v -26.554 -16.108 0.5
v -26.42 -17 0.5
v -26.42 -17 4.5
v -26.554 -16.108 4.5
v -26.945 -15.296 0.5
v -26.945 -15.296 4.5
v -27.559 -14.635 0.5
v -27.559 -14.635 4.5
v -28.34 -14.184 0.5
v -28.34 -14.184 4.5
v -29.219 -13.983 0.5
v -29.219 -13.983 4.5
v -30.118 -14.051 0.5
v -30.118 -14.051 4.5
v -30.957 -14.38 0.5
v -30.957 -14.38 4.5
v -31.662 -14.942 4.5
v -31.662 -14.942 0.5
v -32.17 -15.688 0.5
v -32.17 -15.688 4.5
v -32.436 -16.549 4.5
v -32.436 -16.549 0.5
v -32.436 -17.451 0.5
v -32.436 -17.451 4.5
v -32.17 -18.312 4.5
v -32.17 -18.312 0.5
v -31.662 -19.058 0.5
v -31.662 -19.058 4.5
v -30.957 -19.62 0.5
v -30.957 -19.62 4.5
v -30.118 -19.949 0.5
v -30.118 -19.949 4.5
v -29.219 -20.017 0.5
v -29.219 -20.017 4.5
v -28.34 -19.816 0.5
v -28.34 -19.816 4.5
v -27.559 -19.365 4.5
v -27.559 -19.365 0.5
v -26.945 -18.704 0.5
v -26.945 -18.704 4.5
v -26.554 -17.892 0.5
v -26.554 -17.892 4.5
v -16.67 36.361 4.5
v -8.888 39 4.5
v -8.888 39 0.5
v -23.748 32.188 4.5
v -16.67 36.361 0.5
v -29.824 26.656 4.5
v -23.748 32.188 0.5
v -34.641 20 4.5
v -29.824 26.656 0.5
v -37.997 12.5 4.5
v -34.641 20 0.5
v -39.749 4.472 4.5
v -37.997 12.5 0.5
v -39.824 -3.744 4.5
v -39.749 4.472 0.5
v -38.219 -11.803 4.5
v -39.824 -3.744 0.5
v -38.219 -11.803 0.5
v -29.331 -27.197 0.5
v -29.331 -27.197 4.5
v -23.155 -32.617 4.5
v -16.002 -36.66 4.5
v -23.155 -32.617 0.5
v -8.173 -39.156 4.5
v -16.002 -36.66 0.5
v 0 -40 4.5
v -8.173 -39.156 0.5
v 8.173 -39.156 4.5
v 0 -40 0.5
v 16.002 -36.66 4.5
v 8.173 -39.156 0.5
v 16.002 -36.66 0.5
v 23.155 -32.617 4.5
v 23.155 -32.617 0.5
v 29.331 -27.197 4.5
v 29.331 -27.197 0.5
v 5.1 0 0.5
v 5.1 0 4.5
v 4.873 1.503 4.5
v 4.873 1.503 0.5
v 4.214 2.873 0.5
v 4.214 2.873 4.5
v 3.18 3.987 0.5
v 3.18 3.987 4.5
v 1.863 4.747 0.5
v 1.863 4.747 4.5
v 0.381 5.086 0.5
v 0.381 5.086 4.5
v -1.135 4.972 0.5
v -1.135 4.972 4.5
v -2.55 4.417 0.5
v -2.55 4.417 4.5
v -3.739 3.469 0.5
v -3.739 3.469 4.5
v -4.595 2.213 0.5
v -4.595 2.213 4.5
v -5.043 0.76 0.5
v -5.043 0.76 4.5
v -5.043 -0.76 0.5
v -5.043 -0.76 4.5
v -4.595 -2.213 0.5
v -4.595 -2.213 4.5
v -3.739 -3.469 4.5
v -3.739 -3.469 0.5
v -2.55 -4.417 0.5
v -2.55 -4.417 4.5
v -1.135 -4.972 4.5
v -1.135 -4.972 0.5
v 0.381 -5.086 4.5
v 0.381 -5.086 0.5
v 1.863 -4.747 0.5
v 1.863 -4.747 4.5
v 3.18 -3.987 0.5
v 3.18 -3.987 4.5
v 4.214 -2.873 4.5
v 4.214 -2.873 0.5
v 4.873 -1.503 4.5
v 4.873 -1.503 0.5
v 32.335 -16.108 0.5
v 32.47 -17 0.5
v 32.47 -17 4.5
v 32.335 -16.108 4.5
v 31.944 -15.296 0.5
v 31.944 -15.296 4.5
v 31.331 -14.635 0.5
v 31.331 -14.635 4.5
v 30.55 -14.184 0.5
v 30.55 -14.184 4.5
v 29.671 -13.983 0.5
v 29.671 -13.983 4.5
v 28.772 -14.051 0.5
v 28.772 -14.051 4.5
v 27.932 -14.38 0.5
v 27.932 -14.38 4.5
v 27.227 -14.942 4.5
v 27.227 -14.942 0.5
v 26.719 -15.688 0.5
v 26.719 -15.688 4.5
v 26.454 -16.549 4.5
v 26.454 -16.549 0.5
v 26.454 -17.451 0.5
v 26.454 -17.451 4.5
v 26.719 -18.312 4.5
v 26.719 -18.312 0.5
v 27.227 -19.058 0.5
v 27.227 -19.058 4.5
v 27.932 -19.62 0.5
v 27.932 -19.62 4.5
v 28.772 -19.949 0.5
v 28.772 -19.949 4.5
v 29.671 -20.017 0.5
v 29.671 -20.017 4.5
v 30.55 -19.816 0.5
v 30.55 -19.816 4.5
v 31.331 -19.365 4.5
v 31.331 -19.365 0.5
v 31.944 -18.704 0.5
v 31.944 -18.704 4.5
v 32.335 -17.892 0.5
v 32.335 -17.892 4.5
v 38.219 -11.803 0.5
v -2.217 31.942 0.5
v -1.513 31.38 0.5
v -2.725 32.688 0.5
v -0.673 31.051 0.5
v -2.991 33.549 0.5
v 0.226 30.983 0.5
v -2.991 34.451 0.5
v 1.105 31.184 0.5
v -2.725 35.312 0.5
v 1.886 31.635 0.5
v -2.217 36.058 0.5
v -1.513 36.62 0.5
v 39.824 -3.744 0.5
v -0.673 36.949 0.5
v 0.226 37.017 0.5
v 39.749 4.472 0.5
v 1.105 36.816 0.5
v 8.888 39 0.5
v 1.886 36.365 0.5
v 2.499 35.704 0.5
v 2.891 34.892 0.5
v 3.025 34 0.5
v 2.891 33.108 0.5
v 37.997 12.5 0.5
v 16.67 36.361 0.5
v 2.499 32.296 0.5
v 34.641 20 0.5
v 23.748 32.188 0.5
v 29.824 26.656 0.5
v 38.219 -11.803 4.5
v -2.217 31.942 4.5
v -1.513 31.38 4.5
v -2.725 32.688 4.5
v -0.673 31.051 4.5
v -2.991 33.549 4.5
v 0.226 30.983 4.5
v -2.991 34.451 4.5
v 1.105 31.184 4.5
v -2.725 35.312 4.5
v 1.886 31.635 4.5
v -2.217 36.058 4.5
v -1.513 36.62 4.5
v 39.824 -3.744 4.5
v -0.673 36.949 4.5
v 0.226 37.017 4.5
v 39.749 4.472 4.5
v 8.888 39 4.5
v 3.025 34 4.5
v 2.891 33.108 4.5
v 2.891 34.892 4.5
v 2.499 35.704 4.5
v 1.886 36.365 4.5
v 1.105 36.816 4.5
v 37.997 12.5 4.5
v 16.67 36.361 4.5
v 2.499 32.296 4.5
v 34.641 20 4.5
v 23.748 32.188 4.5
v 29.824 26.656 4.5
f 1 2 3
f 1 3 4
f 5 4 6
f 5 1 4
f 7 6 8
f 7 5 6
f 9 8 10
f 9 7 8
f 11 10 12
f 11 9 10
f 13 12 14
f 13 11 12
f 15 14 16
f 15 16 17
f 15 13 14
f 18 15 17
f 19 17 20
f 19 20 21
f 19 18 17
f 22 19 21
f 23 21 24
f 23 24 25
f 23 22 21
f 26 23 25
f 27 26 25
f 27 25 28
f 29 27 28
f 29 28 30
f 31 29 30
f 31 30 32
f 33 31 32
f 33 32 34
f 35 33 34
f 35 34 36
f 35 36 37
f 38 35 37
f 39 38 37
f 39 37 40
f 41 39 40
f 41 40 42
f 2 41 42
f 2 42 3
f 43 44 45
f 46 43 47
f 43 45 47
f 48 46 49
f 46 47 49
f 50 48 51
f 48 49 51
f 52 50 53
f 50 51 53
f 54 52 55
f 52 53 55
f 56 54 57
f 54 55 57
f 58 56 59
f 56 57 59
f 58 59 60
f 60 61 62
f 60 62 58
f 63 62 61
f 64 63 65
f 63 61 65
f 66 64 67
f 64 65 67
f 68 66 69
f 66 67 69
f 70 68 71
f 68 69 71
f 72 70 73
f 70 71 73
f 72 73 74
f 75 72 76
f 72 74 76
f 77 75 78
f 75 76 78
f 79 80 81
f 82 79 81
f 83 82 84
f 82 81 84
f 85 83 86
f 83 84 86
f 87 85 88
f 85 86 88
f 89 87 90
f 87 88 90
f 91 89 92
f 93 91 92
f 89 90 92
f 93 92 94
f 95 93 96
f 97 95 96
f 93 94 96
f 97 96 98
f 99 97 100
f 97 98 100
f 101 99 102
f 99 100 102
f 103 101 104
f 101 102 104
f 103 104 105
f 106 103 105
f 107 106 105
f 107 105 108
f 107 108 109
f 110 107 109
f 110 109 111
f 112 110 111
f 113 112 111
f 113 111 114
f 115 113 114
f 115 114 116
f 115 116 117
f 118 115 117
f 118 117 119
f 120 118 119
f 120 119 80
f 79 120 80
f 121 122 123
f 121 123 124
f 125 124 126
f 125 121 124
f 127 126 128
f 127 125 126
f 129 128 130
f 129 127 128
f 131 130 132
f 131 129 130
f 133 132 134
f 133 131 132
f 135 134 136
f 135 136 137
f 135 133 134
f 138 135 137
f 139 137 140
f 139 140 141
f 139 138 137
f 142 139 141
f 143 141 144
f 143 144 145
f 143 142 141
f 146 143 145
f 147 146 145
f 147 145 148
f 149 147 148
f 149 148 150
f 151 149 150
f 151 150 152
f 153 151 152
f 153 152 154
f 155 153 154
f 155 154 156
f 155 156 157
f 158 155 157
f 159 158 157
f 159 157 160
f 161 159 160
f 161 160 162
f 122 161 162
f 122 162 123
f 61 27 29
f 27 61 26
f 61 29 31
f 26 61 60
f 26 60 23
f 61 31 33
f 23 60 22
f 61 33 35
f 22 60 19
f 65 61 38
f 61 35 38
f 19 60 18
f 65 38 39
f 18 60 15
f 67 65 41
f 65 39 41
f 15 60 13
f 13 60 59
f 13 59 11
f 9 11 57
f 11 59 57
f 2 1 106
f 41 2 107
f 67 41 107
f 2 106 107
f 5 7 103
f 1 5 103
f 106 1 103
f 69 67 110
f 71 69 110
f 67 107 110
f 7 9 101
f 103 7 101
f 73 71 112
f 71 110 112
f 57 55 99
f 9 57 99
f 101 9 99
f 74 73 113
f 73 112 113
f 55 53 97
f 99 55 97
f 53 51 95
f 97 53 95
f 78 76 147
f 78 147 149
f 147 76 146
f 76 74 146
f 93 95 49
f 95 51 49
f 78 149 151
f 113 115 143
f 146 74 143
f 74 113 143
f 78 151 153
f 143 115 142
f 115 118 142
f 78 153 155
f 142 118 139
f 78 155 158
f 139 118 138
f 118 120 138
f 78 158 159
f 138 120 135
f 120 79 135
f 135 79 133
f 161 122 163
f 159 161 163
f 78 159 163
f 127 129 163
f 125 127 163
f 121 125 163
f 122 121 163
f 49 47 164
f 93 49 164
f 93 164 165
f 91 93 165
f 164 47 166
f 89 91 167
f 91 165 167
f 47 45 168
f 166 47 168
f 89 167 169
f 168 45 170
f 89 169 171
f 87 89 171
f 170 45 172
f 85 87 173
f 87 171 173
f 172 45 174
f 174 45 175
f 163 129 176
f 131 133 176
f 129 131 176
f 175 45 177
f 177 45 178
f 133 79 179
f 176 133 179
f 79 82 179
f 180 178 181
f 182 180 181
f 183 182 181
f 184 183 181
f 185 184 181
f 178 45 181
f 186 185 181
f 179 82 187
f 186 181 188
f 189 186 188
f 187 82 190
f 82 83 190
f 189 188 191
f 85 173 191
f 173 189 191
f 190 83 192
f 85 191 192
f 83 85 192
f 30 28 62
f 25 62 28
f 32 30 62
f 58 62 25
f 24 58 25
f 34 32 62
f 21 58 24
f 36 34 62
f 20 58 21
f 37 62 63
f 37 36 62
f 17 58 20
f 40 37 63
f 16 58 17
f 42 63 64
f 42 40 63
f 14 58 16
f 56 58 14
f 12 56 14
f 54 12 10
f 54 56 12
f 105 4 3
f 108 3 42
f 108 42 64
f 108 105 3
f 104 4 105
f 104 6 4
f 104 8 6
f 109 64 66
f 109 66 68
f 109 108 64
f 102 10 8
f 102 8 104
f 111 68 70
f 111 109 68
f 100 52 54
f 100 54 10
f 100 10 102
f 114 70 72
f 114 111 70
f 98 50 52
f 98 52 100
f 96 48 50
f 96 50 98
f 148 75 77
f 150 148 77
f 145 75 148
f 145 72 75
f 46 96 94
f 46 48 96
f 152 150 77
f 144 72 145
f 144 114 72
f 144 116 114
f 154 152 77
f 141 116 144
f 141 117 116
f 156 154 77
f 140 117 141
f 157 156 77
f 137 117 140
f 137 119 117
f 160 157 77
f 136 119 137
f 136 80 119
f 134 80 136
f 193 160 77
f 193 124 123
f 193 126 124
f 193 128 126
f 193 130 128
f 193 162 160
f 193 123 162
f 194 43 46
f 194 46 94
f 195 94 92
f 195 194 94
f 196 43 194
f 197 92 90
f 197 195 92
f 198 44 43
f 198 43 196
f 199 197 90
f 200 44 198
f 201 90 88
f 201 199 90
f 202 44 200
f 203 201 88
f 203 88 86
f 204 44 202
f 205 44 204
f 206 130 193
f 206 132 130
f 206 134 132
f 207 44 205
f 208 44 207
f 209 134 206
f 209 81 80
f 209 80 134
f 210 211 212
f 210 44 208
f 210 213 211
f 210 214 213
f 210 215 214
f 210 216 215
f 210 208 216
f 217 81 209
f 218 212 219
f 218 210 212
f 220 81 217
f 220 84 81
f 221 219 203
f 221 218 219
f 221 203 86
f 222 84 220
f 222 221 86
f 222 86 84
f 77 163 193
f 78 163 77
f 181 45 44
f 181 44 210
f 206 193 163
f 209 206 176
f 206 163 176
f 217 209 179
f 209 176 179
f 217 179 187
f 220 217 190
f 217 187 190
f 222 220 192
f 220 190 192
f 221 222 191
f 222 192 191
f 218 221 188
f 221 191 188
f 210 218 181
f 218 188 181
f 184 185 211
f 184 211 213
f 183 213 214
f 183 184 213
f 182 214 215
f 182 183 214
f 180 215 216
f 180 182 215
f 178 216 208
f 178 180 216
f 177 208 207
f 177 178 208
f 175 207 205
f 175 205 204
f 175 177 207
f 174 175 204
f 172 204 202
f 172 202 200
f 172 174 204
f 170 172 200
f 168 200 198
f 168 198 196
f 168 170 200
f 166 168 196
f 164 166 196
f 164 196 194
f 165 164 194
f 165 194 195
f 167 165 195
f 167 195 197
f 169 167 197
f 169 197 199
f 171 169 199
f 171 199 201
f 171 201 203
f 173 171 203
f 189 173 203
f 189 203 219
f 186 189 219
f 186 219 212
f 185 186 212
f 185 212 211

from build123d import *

# Parameters (mm, degrees)
BOSS_EXTRUDE1_START = 0.5
SKETCH1_R           = 40
BOSS_EXTRUDE1_DEPTH = 4
CUT_EXTRUDE1_START  = -6
SKETCH2_R           = 3.025
CUT_EXTRUDE1_DEPTH  = 6
SKETCH3_R           = 5.1
CUT_EXTRUDE2_DEPTH  = 15


with BuildPart() as part:
    # Sketch1 → Boss-Extrude1 (new body)
    with BuildSketch(Plane.XY.offset(BOSS_EXTRUDE1_START)):
        Circle(SKETCH1_R)
    extrude(amount=BOSS_EXTRUDE1_DEPTH)

    # Sketch2 → Cut-Extrude1 (cut)
    with BuildSketch(Plane.XY.offset(4.5).offset(CUT_EXTRUDE1_START)):
        with Locations((0, 34)):
            Circle(SKETCH2_R)
        with Locations((29.444863729, -17)):
            Circle(SKETCH2_R)
        with Locations((-29.444863729, -17)):
            Circle(SKETCH2_R)
        with BuildLine():
            Line((-8.888194417, 39), (8.888194417, 39))
            ThreePointArc((8.888194417, 39), (0, 40), (-8.888194417, 39))
        make_face()
        with BuildLine():
            Line((38.219087956, -11.802597841), (29.330893539, -27.197402159))
            ThreePointArc((29.330893539, -27.197402159), (34.641016151, -20), (38.219087956, -11.802597841))
        make_face()
        with BuildLine():
            Line((-29.330893539, -27.197402159), (-38.219087956, -11.802597841))
            ThreePointArc((-38.219087956, -11.802597841), (-34.641016151, -20), (-29.330893539, -27.197402159))
        make_face()
    extrude(amount=CUT_EXTRUDE1_DEPTH, mode=Mode.SUBTRACT)

    # Sketch3 → Cut-Extrude2 (cut)
    with BuildSketch(Plane.XY.offset(4.5)):
        Circle(SKETCH3_R)
    extrude(amount=-CUT_EXTRUDE2_DEPTH, mode=Mode.SUBTRACT)


solid = part.part
